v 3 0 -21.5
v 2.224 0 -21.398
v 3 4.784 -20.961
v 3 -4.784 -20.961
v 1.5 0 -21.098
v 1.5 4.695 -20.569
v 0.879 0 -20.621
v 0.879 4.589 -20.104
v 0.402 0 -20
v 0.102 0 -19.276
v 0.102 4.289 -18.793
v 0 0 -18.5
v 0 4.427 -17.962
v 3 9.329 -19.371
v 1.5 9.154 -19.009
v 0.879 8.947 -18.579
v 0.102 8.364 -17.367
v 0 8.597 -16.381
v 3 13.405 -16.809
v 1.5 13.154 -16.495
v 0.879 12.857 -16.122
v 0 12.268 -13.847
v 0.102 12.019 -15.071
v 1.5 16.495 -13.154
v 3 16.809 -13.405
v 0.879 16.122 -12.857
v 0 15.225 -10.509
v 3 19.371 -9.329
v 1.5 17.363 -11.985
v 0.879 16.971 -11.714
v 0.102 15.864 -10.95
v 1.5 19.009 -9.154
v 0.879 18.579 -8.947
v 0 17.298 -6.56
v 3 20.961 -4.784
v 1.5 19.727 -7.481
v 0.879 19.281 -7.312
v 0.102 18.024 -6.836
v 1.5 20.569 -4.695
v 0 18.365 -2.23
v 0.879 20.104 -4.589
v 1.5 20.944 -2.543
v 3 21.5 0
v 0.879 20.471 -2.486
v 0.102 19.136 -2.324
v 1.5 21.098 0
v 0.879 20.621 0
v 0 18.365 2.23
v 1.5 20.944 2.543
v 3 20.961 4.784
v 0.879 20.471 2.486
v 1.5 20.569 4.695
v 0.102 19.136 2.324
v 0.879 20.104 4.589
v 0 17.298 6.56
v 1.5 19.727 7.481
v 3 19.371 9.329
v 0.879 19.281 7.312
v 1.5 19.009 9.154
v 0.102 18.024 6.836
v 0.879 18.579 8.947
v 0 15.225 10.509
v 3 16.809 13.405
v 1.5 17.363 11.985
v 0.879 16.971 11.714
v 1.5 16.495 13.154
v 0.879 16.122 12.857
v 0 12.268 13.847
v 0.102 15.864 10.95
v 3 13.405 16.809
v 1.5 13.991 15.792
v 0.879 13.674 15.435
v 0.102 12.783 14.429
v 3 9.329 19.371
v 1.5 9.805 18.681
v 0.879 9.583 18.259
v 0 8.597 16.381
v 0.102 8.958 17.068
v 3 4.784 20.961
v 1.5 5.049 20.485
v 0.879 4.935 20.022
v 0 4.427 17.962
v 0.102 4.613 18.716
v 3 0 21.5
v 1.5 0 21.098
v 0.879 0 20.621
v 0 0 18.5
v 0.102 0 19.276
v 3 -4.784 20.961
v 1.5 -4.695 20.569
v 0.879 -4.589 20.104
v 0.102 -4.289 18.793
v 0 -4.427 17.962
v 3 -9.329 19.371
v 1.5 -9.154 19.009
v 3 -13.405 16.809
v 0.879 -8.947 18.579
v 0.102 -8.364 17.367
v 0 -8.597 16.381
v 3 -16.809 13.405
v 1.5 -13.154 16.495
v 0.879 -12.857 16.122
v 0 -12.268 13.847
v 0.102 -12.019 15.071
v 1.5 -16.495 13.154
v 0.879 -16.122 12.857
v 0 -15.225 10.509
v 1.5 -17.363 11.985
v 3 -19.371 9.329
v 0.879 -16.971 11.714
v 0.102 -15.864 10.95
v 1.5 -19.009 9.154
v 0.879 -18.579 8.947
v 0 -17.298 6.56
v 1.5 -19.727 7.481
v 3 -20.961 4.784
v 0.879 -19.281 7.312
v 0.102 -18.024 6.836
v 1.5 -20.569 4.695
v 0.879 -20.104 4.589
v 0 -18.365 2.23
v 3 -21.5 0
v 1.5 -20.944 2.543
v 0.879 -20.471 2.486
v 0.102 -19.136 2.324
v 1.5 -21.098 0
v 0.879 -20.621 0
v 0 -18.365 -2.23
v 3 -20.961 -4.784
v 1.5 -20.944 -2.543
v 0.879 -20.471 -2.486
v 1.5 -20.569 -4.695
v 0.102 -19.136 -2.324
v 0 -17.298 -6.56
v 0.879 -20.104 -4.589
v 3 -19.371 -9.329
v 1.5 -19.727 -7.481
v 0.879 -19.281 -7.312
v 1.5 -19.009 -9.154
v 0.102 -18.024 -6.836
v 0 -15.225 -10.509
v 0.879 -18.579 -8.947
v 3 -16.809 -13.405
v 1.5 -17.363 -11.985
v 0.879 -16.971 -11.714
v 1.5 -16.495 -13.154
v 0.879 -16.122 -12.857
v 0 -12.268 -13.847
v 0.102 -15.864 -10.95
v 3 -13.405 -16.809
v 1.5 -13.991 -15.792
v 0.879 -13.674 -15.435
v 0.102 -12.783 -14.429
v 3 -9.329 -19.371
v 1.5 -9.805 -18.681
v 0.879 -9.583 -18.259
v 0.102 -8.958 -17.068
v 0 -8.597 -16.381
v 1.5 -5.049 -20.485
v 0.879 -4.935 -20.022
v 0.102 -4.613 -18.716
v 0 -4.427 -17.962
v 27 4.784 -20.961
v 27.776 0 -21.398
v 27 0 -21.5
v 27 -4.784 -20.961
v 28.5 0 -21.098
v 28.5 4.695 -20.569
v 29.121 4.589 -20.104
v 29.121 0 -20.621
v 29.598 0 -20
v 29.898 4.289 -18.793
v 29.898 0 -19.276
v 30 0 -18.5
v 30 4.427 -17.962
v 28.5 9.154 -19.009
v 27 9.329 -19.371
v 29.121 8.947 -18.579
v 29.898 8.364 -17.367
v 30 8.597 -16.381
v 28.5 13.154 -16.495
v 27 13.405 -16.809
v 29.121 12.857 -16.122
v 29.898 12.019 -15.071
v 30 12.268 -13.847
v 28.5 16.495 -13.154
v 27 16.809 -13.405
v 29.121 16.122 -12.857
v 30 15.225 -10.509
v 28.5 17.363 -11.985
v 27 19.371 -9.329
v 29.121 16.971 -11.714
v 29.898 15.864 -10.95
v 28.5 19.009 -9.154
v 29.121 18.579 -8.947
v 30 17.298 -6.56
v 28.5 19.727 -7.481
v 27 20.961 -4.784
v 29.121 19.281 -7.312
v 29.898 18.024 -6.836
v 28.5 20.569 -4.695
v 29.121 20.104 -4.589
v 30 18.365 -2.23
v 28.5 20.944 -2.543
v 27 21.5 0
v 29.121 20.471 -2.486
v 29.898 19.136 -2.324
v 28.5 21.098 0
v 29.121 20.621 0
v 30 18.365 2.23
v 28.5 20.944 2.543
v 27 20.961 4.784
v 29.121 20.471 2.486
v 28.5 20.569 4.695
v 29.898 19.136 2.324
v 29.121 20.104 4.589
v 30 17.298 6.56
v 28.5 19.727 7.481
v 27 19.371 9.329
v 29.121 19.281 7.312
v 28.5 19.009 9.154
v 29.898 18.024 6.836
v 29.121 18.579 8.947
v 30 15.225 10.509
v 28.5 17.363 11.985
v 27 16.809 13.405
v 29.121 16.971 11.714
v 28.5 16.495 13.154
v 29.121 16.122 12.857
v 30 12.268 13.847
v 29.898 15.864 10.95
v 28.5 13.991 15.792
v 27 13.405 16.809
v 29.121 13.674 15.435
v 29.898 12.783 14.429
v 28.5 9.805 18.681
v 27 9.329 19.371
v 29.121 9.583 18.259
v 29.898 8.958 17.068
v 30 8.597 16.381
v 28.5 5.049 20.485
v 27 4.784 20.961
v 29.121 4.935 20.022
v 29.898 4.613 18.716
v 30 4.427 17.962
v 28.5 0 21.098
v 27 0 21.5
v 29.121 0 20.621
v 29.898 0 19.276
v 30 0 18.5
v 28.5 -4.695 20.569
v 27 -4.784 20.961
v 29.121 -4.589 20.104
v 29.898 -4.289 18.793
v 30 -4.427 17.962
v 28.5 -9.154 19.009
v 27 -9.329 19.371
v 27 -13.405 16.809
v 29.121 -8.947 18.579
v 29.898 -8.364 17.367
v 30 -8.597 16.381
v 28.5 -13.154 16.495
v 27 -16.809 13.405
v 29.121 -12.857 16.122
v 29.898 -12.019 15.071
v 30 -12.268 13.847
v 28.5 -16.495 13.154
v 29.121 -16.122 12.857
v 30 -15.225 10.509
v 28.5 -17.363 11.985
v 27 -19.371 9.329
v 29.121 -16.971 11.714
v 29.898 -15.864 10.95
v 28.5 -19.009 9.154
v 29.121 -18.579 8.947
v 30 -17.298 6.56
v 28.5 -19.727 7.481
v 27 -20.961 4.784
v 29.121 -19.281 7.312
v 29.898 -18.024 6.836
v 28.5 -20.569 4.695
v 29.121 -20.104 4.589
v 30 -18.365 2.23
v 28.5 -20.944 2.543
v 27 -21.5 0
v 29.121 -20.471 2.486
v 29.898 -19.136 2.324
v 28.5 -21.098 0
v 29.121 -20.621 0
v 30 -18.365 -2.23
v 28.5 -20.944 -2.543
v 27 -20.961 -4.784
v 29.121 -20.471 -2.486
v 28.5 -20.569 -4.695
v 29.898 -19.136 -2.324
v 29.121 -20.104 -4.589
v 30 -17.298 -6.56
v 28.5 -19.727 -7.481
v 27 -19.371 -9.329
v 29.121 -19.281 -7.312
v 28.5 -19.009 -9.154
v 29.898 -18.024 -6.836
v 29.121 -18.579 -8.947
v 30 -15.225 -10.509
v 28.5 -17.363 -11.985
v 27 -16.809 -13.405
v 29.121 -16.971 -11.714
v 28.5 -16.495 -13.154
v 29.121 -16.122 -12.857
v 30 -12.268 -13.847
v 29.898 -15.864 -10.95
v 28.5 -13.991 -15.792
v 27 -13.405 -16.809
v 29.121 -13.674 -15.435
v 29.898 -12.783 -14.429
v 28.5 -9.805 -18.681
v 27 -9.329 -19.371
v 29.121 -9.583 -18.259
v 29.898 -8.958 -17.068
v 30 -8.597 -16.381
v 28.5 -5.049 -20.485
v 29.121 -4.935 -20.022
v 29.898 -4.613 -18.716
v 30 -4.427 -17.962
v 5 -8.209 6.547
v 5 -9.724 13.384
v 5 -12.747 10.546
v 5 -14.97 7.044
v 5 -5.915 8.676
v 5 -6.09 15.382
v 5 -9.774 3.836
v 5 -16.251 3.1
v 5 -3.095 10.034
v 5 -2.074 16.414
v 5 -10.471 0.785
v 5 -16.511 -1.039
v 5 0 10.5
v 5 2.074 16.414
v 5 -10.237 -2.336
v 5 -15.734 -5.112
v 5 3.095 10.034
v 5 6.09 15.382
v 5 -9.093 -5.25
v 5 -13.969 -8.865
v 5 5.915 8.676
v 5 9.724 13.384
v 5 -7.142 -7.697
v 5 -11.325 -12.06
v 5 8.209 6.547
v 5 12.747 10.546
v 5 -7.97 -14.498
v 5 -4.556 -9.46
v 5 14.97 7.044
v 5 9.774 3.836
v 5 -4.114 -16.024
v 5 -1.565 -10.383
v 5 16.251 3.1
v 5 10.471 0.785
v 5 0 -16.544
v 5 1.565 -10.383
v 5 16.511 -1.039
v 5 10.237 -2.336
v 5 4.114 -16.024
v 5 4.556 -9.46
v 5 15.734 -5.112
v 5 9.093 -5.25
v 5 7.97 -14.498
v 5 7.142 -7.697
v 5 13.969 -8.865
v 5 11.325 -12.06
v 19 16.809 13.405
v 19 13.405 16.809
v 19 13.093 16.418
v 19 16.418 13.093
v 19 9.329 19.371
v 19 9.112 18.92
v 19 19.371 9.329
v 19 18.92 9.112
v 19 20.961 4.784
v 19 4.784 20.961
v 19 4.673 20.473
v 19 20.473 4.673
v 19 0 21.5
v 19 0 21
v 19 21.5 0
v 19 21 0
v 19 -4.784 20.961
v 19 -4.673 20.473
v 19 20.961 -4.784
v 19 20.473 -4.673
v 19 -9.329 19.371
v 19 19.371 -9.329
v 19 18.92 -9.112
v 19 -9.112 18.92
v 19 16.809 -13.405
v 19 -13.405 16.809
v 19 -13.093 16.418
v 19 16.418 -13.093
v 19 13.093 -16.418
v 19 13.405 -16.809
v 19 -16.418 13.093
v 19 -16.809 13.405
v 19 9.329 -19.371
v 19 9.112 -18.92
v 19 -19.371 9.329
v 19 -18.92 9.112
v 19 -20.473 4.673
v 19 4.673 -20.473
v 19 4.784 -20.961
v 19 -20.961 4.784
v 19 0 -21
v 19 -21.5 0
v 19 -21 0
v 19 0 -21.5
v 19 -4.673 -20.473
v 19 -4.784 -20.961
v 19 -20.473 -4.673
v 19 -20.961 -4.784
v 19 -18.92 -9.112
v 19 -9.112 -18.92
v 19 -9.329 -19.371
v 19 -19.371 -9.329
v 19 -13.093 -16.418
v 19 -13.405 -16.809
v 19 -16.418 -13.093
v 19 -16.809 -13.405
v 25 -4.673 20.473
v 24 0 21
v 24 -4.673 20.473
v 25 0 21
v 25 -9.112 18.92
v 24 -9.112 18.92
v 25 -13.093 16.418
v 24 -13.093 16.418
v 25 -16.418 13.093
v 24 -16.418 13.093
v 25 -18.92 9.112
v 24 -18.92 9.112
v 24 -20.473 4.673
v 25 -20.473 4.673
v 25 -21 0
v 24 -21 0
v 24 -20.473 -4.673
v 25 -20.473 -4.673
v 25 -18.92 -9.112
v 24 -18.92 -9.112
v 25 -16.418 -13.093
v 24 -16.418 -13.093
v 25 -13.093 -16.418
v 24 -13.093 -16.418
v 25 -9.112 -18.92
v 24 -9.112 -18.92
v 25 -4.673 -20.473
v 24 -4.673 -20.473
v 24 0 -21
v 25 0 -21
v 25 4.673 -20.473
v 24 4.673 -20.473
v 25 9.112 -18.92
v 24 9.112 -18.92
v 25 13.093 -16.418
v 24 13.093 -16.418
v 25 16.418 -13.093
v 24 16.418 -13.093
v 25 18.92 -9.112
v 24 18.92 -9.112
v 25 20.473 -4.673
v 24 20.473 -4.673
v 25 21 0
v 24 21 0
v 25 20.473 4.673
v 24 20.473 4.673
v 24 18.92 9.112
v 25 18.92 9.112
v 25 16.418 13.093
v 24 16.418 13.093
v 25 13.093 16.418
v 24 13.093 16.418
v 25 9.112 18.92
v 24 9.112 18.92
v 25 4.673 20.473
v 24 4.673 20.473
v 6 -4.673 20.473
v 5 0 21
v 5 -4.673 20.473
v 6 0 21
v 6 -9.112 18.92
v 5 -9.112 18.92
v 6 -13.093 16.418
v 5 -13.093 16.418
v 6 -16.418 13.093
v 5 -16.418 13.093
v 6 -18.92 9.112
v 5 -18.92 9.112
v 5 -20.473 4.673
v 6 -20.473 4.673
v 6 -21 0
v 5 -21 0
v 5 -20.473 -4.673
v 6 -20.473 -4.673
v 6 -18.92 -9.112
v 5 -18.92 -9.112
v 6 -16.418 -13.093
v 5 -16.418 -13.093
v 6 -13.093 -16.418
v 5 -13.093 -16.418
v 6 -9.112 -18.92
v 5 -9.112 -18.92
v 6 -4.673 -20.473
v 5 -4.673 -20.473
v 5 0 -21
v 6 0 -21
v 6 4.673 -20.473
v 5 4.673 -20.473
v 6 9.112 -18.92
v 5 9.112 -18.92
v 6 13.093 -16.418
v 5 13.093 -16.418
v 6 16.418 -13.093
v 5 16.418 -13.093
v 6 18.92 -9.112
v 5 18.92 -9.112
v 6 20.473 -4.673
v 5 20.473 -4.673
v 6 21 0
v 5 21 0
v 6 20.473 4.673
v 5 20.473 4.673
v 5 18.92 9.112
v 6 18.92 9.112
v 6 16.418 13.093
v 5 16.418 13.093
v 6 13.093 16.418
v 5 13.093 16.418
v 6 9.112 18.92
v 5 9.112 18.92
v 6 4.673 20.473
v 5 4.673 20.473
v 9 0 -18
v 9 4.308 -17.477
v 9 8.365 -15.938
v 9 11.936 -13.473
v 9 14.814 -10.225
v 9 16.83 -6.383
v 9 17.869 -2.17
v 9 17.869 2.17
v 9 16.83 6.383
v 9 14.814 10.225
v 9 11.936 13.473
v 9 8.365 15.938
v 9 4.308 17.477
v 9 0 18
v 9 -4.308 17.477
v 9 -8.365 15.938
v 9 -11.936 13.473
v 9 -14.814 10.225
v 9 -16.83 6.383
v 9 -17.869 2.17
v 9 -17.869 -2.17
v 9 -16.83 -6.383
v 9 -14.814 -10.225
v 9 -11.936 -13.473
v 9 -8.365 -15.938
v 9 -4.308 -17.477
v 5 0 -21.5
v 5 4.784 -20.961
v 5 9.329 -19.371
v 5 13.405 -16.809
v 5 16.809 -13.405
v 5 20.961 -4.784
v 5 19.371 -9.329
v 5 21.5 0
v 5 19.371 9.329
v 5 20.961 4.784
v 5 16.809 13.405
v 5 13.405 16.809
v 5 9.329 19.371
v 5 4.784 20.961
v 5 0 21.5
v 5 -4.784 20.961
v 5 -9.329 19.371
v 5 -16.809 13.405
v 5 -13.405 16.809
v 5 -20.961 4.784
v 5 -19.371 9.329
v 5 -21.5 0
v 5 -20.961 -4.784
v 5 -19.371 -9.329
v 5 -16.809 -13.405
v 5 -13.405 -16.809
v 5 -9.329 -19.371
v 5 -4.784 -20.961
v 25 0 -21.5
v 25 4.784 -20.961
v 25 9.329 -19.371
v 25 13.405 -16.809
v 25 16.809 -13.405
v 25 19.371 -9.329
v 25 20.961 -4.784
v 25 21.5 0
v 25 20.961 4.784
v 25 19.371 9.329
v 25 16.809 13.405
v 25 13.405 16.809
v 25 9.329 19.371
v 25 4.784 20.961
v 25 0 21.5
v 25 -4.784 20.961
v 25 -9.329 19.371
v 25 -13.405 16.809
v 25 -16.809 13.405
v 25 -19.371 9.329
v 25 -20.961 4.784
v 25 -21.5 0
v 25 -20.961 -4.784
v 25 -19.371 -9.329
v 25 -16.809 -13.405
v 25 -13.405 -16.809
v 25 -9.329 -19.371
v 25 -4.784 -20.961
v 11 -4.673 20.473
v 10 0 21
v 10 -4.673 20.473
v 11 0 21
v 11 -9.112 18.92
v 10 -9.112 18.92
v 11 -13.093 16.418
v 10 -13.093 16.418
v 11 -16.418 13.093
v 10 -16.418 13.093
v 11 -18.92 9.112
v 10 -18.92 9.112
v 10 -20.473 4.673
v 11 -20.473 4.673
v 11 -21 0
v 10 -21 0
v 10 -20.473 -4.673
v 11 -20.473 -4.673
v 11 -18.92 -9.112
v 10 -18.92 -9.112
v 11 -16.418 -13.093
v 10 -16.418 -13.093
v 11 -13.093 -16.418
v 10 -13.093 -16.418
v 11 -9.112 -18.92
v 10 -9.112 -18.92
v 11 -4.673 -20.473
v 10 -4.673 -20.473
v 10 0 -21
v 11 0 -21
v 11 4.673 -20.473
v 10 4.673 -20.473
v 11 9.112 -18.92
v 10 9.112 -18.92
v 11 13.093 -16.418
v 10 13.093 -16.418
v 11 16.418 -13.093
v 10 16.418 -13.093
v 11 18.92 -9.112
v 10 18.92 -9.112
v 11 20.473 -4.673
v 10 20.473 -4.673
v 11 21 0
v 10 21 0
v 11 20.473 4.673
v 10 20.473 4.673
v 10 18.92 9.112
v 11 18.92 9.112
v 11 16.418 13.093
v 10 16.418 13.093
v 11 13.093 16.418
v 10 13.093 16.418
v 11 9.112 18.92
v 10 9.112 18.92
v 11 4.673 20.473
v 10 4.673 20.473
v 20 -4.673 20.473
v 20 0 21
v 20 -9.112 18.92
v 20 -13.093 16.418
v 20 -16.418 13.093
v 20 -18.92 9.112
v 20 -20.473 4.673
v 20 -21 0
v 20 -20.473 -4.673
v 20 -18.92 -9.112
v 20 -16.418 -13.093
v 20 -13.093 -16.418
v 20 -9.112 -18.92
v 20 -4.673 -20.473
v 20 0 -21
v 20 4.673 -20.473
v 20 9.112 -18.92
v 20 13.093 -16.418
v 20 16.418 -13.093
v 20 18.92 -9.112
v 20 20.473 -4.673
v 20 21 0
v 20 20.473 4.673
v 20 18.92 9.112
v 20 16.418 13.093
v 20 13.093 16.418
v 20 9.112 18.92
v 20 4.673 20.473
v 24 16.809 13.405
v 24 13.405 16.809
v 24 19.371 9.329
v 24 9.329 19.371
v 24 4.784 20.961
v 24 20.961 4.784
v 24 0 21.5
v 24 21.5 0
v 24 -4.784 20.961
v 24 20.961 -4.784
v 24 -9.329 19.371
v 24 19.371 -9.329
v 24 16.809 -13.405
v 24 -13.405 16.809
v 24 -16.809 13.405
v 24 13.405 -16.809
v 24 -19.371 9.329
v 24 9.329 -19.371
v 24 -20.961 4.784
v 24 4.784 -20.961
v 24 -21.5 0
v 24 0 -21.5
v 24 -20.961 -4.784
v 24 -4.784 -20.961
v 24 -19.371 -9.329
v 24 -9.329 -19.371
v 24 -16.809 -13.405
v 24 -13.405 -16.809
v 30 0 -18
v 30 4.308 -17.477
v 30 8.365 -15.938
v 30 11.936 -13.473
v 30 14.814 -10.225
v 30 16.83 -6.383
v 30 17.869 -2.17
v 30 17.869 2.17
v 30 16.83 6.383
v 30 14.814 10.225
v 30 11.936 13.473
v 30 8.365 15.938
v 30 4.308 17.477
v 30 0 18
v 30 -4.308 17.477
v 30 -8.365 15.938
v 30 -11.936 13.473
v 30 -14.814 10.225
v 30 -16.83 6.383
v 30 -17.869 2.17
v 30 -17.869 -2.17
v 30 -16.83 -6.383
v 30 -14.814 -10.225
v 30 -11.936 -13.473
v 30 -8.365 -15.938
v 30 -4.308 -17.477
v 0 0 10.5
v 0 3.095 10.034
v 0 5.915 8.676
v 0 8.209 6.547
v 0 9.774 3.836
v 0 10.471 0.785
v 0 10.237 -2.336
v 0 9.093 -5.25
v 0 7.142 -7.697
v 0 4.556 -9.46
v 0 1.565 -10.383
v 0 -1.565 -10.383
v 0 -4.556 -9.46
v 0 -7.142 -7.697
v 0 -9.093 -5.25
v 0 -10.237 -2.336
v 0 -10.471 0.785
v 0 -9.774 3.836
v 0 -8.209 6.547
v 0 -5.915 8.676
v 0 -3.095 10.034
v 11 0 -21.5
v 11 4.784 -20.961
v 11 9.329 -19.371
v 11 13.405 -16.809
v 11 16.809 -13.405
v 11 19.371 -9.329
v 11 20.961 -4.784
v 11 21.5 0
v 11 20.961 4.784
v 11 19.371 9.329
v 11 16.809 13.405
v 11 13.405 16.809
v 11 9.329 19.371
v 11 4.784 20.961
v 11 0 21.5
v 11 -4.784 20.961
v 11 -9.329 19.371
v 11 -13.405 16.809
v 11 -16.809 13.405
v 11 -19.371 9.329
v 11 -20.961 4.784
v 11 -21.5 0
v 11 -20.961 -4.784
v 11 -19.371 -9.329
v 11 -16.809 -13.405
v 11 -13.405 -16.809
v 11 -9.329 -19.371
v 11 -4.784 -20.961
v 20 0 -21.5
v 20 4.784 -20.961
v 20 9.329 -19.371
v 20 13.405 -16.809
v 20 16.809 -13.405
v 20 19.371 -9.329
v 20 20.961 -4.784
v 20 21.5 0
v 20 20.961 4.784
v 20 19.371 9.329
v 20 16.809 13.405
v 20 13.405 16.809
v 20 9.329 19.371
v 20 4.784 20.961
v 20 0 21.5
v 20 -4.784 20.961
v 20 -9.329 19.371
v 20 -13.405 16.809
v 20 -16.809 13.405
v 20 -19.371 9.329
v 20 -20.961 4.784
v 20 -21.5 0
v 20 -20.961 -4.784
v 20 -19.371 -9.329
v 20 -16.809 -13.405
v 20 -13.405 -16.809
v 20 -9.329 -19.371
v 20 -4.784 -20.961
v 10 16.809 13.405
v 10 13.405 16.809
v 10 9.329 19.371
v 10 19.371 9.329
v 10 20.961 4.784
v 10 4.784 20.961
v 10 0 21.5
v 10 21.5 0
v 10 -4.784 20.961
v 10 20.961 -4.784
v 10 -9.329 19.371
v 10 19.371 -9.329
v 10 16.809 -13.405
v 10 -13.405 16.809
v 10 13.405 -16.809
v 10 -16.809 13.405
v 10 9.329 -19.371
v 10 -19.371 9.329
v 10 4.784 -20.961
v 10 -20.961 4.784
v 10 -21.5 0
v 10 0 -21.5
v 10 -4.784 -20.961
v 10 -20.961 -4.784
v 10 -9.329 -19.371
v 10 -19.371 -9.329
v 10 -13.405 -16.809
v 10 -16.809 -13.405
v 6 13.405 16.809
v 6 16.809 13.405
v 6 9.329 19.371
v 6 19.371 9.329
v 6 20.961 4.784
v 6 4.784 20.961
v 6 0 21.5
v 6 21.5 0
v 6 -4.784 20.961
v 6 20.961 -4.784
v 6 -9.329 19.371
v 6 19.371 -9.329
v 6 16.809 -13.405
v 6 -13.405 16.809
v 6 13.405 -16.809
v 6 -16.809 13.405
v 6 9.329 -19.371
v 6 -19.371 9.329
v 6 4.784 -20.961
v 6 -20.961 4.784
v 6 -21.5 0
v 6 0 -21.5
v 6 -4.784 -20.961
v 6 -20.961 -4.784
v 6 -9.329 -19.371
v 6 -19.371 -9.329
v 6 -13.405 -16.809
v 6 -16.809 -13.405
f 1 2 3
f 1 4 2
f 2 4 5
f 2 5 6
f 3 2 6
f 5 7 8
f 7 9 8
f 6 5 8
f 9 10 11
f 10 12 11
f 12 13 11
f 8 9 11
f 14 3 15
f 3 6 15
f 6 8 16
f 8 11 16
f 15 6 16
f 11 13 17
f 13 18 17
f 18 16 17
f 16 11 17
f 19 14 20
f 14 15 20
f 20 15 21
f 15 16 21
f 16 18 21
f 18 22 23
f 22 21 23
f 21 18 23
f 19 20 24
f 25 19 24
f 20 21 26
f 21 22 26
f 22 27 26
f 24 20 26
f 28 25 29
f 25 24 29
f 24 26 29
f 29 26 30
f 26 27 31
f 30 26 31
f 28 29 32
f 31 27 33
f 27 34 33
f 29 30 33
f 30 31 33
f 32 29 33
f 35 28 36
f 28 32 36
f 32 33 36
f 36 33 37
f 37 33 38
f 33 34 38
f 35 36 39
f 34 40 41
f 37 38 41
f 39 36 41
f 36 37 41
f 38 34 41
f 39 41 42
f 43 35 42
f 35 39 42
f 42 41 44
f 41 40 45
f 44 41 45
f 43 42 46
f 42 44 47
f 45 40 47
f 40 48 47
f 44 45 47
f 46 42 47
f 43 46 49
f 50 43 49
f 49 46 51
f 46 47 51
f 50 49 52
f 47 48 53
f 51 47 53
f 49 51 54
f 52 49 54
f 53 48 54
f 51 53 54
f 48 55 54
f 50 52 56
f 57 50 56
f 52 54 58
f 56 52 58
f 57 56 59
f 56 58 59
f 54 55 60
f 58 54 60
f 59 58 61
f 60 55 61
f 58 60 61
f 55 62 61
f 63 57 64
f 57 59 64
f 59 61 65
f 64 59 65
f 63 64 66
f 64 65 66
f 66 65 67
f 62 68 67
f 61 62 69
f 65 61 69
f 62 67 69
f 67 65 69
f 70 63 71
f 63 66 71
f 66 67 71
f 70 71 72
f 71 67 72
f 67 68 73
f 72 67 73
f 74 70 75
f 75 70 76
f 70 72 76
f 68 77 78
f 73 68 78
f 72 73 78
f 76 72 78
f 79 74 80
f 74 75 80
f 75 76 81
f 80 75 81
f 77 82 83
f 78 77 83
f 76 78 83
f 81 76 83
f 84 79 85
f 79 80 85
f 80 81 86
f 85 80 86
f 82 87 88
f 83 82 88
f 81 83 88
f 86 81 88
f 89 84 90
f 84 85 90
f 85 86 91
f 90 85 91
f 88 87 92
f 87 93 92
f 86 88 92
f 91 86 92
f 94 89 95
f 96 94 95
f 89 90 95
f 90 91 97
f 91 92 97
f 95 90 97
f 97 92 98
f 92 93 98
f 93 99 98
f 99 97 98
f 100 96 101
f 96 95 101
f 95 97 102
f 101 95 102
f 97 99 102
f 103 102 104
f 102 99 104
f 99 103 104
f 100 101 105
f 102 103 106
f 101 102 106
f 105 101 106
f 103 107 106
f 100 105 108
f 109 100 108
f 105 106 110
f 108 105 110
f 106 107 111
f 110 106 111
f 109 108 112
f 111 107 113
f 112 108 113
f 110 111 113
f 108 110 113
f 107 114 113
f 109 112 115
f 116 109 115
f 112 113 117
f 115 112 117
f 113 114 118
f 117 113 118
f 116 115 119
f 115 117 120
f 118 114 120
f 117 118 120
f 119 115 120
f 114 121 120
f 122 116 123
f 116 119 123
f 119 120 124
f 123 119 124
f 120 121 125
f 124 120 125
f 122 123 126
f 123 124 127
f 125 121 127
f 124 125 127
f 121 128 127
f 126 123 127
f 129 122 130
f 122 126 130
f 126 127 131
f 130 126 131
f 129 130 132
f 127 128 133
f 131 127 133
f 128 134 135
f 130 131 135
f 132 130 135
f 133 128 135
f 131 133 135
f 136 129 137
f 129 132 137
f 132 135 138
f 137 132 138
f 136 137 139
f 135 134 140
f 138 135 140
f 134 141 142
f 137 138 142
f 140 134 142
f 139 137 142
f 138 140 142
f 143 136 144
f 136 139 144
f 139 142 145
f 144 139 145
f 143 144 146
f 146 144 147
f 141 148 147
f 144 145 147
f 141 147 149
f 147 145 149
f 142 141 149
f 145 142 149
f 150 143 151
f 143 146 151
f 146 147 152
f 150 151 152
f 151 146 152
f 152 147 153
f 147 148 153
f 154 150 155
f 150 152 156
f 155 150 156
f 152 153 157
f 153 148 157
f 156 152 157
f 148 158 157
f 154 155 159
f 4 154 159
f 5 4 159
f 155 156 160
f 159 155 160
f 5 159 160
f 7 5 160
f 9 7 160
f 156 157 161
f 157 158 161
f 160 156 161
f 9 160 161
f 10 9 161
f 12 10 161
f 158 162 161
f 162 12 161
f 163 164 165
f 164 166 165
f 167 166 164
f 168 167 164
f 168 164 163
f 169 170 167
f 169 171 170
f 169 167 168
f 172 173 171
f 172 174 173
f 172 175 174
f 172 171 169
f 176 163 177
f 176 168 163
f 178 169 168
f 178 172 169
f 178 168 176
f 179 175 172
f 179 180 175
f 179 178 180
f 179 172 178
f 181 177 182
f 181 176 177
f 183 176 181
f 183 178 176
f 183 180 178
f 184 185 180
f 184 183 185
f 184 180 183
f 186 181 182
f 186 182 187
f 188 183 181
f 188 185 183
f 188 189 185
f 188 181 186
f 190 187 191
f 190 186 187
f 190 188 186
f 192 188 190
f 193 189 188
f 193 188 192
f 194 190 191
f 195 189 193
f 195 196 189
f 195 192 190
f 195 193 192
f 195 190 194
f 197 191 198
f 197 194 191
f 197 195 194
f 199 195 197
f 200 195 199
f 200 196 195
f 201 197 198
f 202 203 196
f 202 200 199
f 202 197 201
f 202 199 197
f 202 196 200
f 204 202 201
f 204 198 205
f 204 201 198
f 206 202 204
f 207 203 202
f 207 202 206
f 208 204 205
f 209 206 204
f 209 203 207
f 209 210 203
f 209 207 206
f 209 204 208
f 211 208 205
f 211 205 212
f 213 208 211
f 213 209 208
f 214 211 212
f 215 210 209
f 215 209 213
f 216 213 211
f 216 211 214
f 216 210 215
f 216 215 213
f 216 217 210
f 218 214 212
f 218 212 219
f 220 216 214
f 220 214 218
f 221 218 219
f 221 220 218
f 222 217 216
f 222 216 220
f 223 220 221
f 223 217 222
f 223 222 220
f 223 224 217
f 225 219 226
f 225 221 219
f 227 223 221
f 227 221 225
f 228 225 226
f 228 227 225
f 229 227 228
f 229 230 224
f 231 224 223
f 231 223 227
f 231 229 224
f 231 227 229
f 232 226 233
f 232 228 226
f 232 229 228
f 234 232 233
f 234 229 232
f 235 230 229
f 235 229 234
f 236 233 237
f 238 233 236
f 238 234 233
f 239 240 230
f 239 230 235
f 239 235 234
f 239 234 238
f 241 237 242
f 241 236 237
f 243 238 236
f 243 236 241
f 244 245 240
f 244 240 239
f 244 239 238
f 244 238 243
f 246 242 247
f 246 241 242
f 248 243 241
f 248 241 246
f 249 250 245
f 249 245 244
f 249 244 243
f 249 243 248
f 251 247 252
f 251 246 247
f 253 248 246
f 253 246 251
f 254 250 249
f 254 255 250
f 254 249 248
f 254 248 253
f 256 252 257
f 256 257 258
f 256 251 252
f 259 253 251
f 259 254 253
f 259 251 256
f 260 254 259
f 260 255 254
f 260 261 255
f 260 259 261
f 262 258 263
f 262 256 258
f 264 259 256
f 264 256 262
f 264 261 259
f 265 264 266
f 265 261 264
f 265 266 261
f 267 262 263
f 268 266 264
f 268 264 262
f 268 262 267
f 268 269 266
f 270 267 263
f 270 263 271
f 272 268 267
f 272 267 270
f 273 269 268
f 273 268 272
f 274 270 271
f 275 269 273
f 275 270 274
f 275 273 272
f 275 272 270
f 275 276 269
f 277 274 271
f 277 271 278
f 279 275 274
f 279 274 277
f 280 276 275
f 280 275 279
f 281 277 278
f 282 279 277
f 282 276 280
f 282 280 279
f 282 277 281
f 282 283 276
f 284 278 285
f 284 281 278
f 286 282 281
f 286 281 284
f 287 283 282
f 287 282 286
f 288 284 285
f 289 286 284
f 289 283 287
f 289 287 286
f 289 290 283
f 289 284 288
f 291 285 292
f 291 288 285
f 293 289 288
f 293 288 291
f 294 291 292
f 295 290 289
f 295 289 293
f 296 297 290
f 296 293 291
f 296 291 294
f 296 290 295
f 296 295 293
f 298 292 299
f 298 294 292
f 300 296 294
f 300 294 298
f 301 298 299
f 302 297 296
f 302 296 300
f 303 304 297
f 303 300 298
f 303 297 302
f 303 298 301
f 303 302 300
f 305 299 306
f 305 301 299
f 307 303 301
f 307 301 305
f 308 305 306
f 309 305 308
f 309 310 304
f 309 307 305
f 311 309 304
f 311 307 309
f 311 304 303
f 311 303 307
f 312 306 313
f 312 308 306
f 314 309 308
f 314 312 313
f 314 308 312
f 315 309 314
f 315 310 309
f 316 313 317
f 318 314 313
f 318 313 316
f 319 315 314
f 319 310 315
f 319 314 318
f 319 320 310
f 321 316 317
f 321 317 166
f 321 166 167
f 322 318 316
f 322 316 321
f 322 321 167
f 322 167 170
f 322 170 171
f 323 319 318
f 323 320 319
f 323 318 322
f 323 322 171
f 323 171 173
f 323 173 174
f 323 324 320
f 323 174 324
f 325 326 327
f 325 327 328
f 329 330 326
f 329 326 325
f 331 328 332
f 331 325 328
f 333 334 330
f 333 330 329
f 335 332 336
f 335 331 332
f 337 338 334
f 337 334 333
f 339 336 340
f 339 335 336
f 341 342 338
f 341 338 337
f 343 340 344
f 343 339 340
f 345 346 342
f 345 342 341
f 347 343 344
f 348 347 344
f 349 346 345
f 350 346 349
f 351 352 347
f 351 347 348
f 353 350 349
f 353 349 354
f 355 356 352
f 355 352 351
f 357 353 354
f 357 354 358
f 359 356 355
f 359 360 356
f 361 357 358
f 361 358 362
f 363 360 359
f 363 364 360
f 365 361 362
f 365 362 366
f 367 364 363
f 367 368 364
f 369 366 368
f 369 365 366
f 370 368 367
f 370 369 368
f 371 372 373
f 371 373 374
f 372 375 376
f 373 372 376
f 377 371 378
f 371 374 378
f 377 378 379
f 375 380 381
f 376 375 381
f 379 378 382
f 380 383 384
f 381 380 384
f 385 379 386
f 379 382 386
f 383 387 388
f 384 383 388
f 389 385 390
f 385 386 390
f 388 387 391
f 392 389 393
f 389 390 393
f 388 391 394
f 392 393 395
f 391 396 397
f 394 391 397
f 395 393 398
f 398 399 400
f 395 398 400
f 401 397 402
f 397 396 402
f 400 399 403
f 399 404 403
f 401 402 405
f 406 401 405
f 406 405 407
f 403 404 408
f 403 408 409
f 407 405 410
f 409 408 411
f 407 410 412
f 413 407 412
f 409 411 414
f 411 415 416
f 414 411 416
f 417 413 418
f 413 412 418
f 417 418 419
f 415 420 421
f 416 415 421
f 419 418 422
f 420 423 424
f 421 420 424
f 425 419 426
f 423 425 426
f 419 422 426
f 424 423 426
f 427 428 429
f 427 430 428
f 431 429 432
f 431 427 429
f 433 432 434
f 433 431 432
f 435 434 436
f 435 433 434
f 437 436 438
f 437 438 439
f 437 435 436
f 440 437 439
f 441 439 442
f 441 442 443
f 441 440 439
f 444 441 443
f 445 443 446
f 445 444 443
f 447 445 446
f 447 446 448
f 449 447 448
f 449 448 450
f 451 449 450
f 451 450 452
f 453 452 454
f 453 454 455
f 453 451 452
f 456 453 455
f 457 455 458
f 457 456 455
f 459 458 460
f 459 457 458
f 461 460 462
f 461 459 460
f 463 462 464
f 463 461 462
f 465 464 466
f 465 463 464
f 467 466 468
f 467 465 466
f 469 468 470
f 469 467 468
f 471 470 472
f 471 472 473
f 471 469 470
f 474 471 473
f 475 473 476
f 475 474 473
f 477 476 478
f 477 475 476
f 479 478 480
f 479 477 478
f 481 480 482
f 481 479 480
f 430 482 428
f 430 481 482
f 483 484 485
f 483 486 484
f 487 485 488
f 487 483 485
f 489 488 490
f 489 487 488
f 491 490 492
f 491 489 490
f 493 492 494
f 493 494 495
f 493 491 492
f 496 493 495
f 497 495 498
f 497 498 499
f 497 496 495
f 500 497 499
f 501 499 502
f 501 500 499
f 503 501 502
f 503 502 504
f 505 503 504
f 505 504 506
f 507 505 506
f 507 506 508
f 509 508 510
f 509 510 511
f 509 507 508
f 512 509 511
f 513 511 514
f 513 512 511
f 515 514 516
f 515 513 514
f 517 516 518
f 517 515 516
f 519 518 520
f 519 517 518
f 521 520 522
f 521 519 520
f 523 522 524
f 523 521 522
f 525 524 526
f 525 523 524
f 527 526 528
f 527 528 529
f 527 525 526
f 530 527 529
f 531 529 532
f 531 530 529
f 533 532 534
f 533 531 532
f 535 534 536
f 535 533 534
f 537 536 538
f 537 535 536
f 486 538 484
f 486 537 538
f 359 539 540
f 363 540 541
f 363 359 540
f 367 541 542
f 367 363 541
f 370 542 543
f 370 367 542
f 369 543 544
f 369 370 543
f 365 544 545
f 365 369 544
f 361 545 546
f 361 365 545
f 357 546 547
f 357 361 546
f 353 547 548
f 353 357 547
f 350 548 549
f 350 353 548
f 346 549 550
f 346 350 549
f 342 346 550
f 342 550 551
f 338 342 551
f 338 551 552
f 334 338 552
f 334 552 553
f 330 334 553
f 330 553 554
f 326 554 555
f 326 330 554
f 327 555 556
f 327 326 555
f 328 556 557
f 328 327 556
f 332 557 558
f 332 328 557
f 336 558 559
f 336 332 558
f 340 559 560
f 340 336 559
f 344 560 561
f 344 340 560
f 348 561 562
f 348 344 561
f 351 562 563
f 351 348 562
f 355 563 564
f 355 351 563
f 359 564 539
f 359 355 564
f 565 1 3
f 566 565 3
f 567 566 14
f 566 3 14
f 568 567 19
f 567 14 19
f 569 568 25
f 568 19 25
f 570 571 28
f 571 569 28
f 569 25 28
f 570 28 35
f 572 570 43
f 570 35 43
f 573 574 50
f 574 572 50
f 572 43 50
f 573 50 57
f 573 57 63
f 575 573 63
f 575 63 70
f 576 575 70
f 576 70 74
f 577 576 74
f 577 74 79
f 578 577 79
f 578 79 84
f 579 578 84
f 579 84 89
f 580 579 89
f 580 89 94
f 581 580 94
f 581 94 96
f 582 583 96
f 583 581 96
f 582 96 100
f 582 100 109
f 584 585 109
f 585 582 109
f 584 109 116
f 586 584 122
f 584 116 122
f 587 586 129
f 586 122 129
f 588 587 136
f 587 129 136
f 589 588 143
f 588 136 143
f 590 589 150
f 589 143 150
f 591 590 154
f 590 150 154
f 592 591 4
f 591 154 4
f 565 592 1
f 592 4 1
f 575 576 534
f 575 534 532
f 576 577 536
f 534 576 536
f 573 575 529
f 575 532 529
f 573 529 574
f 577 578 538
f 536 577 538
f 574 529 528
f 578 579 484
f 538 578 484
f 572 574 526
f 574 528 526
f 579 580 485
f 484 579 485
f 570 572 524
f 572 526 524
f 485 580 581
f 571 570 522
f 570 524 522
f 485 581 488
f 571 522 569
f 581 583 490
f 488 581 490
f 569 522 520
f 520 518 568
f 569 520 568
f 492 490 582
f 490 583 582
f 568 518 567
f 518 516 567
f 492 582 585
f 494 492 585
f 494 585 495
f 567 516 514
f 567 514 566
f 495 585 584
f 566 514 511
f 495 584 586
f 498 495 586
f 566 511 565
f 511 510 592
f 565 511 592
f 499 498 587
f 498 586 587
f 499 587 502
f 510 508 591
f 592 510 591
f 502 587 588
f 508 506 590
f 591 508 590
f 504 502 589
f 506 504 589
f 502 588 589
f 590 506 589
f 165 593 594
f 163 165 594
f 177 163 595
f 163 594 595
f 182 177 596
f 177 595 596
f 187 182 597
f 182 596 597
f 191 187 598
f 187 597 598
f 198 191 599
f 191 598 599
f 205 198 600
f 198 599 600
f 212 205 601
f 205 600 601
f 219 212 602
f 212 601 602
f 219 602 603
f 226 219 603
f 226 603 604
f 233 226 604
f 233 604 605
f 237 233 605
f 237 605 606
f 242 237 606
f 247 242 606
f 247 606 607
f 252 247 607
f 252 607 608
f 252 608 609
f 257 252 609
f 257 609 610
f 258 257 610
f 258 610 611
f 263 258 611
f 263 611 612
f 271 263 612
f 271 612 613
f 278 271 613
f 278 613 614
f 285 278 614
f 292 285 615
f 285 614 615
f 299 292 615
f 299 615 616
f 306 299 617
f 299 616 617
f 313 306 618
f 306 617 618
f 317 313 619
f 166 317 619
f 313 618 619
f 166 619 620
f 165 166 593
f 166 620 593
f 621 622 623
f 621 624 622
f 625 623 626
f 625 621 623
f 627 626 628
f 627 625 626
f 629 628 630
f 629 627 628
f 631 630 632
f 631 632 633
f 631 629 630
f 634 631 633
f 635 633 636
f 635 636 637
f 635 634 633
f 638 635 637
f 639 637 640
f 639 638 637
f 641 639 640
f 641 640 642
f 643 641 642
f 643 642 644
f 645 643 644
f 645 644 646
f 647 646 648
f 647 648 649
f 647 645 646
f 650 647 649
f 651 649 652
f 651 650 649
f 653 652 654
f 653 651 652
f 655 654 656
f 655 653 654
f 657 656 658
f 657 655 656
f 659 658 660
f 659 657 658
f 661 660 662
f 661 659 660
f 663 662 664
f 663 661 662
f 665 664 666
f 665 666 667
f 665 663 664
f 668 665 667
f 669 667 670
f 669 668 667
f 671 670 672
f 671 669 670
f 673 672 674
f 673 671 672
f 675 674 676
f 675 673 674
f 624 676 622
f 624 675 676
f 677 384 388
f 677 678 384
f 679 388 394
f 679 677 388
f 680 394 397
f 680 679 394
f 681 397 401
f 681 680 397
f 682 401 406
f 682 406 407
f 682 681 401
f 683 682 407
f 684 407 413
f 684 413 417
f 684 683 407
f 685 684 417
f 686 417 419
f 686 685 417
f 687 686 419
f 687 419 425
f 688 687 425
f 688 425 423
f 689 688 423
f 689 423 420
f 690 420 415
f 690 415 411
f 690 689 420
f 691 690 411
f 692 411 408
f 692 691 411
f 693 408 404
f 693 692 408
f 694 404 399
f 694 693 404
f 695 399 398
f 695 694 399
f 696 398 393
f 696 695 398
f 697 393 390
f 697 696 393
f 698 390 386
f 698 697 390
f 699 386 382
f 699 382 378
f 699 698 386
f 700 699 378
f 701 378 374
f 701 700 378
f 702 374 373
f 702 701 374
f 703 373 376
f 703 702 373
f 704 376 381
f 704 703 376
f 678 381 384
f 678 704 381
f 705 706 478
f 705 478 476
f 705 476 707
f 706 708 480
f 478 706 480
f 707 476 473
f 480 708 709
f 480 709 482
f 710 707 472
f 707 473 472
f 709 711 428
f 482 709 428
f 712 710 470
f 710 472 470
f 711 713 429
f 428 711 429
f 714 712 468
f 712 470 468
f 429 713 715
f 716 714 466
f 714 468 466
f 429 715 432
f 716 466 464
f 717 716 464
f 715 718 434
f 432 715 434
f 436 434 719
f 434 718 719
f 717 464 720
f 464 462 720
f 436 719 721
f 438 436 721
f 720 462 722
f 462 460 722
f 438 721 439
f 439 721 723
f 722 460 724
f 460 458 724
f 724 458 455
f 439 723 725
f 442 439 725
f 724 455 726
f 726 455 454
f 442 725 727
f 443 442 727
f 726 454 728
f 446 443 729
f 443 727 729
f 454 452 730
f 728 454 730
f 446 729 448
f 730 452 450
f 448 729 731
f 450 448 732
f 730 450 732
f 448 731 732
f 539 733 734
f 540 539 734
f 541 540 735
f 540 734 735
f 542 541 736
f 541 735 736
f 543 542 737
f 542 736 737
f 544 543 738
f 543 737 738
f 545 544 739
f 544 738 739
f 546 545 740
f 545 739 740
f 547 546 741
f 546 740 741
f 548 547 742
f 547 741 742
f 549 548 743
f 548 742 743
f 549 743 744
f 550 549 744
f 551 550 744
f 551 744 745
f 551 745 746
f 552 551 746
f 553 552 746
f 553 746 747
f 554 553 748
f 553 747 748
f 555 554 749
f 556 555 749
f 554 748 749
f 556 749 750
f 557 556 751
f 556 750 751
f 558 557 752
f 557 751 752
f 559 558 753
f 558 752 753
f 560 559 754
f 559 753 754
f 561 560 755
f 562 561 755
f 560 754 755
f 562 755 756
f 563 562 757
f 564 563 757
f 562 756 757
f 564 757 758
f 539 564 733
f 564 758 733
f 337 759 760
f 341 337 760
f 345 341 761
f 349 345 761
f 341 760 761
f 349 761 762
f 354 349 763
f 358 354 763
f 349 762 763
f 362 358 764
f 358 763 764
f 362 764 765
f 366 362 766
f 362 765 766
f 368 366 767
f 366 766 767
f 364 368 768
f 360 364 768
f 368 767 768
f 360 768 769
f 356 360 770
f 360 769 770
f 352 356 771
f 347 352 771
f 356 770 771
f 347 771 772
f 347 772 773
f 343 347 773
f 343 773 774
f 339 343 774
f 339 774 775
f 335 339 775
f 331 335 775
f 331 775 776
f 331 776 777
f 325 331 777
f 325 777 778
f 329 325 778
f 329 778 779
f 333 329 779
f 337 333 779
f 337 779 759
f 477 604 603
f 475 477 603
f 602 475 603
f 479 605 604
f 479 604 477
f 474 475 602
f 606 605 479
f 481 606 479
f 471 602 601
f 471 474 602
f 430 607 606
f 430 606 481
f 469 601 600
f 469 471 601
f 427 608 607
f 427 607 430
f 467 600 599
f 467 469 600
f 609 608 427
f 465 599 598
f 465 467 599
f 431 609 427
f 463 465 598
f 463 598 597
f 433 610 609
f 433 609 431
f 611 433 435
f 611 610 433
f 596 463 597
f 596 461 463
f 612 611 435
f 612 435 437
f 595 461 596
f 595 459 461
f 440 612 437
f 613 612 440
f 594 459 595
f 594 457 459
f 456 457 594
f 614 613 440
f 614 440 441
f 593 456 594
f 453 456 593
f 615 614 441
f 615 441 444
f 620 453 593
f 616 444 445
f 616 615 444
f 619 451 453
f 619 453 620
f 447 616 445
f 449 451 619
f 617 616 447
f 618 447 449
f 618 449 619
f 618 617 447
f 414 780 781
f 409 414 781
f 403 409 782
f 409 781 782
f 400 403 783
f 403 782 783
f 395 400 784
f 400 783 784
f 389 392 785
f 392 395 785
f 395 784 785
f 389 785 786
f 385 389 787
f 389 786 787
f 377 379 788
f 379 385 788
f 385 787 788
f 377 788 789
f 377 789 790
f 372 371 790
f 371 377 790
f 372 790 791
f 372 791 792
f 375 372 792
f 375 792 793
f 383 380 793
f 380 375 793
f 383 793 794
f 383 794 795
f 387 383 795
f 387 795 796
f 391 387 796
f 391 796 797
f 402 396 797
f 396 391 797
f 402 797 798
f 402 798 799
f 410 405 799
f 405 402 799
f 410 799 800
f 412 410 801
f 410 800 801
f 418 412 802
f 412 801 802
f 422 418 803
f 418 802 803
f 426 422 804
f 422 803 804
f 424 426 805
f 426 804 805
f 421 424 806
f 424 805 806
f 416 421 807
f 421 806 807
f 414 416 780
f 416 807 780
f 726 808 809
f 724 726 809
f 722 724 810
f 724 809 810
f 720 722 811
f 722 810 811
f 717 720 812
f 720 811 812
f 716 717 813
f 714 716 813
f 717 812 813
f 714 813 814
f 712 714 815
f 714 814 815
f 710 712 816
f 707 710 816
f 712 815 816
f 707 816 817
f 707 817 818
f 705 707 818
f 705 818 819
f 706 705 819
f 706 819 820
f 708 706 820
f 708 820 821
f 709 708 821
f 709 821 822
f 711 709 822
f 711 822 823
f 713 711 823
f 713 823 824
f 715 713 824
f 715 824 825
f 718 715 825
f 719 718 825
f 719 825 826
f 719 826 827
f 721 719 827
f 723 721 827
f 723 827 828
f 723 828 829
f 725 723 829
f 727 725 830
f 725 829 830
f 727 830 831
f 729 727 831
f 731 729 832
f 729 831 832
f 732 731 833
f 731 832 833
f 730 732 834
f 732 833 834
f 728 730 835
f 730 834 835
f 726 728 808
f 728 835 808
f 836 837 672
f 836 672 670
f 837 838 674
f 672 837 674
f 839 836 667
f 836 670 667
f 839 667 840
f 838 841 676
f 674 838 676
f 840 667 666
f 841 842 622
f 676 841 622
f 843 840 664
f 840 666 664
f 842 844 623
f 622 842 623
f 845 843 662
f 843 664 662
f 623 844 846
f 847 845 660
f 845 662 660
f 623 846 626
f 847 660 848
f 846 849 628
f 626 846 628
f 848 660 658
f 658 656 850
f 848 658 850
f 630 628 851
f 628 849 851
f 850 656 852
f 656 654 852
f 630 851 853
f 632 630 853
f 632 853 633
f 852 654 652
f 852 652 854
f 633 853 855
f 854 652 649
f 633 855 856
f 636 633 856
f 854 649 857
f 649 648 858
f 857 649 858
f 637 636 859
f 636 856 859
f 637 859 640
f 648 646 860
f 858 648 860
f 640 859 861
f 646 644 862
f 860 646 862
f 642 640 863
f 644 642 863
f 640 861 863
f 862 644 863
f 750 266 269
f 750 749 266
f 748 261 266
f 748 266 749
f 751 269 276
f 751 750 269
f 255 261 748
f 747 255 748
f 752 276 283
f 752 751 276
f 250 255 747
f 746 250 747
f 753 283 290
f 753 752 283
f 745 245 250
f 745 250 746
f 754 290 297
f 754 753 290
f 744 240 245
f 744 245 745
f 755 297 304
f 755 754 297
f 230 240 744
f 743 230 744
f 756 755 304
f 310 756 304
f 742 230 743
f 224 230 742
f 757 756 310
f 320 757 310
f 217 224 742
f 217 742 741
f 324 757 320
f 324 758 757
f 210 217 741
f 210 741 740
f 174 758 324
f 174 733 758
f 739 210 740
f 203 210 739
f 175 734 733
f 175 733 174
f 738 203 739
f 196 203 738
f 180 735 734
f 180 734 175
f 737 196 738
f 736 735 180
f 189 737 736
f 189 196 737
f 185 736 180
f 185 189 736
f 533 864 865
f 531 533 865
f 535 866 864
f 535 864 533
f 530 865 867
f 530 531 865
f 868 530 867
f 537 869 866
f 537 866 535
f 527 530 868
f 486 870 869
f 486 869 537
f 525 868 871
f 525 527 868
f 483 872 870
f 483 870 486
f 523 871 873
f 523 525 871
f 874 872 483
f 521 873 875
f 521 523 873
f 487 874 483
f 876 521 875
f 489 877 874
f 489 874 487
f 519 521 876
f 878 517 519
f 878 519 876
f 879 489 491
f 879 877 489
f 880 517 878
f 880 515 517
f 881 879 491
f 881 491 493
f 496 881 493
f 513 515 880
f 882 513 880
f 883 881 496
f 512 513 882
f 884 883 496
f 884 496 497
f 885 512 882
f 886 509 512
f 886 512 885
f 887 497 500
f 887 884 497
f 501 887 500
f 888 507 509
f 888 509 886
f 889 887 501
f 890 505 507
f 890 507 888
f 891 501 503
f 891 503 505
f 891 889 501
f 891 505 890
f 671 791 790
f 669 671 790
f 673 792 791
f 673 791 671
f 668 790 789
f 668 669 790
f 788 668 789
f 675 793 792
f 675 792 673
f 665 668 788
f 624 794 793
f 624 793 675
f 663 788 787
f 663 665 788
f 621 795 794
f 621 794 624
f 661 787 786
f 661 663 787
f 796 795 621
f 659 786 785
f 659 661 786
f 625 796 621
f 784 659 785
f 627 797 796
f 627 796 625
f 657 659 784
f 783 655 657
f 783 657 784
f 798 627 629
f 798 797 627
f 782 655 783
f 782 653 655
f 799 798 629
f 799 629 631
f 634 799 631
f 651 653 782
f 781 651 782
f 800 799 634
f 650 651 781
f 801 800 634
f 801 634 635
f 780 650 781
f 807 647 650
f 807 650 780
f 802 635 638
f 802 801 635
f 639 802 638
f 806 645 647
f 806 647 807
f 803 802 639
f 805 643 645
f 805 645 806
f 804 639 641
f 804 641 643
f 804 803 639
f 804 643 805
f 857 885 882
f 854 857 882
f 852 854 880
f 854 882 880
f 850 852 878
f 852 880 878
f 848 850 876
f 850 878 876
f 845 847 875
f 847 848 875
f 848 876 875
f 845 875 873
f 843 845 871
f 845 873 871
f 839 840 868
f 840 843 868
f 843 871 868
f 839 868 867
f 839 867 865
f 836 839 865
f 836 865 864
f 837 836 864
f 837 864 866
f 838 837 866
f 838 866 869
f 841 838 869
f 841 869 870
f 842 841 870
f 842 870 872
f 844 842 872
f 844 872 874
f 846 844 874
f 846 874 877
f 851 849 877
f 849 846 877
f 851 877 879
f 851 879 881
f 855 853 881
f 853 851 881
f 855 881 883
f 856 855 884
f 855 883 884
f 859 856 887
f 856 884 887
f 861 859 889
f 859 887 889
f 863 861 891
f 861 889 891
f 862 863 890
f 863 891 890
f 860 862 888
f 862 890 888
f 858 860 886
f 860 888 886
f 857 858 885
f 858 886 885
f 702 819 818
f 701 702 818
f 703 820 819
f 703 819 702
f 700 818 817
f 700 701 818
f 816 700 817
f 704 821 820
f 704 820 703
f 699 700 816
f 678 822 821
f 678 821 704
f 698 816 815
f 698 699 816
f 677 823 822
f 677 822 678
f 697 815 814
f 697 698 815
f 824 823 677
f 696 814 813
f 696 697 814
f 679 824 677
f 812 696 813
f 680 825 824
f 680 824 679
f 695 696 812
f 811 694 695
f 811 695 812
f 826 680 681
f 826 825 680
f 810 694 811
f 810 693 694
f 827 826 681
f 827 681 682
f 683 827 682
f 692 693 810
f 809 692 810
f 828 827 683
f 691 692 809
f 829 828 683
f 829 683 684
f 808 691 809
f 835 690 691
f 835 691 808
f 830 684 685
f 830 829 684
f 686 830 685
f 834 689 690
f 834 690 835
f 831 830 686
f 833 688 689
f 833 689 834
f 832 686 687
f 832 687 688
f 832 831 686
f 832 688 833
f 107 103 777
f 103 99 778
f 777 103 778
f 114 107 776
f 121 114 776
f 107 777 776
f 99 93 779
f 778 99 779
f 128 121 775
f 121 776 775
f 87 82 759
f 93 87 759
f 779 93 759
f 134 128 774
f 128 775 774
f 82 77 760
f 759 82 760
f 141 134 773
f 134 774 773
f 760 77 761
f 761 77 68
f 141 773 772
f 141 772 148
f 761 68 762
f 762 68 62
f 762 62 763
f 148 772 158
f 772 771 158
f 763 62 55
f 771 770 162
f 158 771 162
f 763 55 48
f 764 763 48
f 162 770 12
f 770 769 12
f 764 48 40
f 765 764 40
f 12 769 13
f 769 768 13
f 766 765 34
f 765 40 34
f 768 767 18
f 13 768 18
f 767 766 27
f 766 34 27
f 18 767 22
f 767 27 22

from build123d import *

# Parameters (mm, degrees)
SKETCH1_R           = 21.5
BOSS_EXTRUDE1_DEPTH = 30
SKETCH2_R           = 18
CUT_EXTRUDE1_DEPTH  = 25
SKETCH4_R           = 10.5
CUT_EXTRUDE2_DEPTH  = 43.714166268
FILLET1_R           = 3
SKETCH5_W           = 1
SKETCH5_H           = 0.5
CHAMFER1_SIZE       = 4
CHAMFER1_SIZE2      = 1.455880937


with BuildPart() as part:
    # Sketch1 → Boss-Extrude1 (new body)
    with BuildSketch(Plane(origin=(0, 0, 0), x_dir=(0, 0, -1), z_dir=(1, 0, 0))):
        Circle(SKETCH1_R)
    extrude(amount=BOSS_EXTRUDE1_DEPTH)

    # Sketch2 → Cut-Extrude1 (cut)
    with BuildSketch(Plane(origin=(30, 0, 0), x_dir=(0, 0, -1), z_dir=(1, 0, 0))):
        Circle(SKETCH2_R)
    extrude(amount=-CUT_EXTRUDE1_DEPTH, mode=Mode.SUBTRACT)

    # Sketch4 → Cut-Extrude2 (cut, through all)
    with BuildSketch(Plane.ZY):
        Circle(SKETCH4_R)
    extrude(amount=-CUT_EXTRUDE2_DEPTH, mode=Mode.SUBTRACT)

    # Fillet1
    fillet1_edges = [part.edges().sort_by_distance(p)[0] for p in [
        (0, 0, 21.5),
        (30, 0, 21.5),
    ]]
    fillet(fillet1_edges, radius=FILLET1_R)

    # Sketch5 → Cut-Revolve1 (revolve, cut)
    with BuildSketch(Plane.XY, mode=Mode.PRIVATE) as cut_revolve1_sk:
        with Locations((5.5, 21.25)):
            Rectangle(SKETCH5_W, SKETCH5_H)
        with Locations((24.5, 21.25)):
            Rectangle(SKETCH5_W, SKETCH5_H)
        with Locations((10.5, 21.25)):
            Rectangle(SKETCH5_W, SKETCH5_H)
        with Locations((19.5, 21.25)):
            Rectangle(SKETCH5_W, SKETCH5_H)
    revolve(cut_revolve1_sk.sketch.rotate(Axis((0, 0, 0), (1, 0, 0)), 90), axis=Axis((0, 0, 0), (1, 0, 0)), mode=Mode.SUBTRACT)

    # Chamfer1
    chamfer1_edges = [part.edges().sort_by_distance(p)[0] for p in [
        (5, 0, 18),
    ]]
    chamfer1_side = [part.faces().sort_by_distance(p)[0] for p in [
        (17.5, 0, 18),
    ]]
    chamfer(chamfer1_edges, length=CHAMFER1_SIZE, length2=CHAMFER1_SIZE2, reference=chamfer1_side[0])


solid = part.part
